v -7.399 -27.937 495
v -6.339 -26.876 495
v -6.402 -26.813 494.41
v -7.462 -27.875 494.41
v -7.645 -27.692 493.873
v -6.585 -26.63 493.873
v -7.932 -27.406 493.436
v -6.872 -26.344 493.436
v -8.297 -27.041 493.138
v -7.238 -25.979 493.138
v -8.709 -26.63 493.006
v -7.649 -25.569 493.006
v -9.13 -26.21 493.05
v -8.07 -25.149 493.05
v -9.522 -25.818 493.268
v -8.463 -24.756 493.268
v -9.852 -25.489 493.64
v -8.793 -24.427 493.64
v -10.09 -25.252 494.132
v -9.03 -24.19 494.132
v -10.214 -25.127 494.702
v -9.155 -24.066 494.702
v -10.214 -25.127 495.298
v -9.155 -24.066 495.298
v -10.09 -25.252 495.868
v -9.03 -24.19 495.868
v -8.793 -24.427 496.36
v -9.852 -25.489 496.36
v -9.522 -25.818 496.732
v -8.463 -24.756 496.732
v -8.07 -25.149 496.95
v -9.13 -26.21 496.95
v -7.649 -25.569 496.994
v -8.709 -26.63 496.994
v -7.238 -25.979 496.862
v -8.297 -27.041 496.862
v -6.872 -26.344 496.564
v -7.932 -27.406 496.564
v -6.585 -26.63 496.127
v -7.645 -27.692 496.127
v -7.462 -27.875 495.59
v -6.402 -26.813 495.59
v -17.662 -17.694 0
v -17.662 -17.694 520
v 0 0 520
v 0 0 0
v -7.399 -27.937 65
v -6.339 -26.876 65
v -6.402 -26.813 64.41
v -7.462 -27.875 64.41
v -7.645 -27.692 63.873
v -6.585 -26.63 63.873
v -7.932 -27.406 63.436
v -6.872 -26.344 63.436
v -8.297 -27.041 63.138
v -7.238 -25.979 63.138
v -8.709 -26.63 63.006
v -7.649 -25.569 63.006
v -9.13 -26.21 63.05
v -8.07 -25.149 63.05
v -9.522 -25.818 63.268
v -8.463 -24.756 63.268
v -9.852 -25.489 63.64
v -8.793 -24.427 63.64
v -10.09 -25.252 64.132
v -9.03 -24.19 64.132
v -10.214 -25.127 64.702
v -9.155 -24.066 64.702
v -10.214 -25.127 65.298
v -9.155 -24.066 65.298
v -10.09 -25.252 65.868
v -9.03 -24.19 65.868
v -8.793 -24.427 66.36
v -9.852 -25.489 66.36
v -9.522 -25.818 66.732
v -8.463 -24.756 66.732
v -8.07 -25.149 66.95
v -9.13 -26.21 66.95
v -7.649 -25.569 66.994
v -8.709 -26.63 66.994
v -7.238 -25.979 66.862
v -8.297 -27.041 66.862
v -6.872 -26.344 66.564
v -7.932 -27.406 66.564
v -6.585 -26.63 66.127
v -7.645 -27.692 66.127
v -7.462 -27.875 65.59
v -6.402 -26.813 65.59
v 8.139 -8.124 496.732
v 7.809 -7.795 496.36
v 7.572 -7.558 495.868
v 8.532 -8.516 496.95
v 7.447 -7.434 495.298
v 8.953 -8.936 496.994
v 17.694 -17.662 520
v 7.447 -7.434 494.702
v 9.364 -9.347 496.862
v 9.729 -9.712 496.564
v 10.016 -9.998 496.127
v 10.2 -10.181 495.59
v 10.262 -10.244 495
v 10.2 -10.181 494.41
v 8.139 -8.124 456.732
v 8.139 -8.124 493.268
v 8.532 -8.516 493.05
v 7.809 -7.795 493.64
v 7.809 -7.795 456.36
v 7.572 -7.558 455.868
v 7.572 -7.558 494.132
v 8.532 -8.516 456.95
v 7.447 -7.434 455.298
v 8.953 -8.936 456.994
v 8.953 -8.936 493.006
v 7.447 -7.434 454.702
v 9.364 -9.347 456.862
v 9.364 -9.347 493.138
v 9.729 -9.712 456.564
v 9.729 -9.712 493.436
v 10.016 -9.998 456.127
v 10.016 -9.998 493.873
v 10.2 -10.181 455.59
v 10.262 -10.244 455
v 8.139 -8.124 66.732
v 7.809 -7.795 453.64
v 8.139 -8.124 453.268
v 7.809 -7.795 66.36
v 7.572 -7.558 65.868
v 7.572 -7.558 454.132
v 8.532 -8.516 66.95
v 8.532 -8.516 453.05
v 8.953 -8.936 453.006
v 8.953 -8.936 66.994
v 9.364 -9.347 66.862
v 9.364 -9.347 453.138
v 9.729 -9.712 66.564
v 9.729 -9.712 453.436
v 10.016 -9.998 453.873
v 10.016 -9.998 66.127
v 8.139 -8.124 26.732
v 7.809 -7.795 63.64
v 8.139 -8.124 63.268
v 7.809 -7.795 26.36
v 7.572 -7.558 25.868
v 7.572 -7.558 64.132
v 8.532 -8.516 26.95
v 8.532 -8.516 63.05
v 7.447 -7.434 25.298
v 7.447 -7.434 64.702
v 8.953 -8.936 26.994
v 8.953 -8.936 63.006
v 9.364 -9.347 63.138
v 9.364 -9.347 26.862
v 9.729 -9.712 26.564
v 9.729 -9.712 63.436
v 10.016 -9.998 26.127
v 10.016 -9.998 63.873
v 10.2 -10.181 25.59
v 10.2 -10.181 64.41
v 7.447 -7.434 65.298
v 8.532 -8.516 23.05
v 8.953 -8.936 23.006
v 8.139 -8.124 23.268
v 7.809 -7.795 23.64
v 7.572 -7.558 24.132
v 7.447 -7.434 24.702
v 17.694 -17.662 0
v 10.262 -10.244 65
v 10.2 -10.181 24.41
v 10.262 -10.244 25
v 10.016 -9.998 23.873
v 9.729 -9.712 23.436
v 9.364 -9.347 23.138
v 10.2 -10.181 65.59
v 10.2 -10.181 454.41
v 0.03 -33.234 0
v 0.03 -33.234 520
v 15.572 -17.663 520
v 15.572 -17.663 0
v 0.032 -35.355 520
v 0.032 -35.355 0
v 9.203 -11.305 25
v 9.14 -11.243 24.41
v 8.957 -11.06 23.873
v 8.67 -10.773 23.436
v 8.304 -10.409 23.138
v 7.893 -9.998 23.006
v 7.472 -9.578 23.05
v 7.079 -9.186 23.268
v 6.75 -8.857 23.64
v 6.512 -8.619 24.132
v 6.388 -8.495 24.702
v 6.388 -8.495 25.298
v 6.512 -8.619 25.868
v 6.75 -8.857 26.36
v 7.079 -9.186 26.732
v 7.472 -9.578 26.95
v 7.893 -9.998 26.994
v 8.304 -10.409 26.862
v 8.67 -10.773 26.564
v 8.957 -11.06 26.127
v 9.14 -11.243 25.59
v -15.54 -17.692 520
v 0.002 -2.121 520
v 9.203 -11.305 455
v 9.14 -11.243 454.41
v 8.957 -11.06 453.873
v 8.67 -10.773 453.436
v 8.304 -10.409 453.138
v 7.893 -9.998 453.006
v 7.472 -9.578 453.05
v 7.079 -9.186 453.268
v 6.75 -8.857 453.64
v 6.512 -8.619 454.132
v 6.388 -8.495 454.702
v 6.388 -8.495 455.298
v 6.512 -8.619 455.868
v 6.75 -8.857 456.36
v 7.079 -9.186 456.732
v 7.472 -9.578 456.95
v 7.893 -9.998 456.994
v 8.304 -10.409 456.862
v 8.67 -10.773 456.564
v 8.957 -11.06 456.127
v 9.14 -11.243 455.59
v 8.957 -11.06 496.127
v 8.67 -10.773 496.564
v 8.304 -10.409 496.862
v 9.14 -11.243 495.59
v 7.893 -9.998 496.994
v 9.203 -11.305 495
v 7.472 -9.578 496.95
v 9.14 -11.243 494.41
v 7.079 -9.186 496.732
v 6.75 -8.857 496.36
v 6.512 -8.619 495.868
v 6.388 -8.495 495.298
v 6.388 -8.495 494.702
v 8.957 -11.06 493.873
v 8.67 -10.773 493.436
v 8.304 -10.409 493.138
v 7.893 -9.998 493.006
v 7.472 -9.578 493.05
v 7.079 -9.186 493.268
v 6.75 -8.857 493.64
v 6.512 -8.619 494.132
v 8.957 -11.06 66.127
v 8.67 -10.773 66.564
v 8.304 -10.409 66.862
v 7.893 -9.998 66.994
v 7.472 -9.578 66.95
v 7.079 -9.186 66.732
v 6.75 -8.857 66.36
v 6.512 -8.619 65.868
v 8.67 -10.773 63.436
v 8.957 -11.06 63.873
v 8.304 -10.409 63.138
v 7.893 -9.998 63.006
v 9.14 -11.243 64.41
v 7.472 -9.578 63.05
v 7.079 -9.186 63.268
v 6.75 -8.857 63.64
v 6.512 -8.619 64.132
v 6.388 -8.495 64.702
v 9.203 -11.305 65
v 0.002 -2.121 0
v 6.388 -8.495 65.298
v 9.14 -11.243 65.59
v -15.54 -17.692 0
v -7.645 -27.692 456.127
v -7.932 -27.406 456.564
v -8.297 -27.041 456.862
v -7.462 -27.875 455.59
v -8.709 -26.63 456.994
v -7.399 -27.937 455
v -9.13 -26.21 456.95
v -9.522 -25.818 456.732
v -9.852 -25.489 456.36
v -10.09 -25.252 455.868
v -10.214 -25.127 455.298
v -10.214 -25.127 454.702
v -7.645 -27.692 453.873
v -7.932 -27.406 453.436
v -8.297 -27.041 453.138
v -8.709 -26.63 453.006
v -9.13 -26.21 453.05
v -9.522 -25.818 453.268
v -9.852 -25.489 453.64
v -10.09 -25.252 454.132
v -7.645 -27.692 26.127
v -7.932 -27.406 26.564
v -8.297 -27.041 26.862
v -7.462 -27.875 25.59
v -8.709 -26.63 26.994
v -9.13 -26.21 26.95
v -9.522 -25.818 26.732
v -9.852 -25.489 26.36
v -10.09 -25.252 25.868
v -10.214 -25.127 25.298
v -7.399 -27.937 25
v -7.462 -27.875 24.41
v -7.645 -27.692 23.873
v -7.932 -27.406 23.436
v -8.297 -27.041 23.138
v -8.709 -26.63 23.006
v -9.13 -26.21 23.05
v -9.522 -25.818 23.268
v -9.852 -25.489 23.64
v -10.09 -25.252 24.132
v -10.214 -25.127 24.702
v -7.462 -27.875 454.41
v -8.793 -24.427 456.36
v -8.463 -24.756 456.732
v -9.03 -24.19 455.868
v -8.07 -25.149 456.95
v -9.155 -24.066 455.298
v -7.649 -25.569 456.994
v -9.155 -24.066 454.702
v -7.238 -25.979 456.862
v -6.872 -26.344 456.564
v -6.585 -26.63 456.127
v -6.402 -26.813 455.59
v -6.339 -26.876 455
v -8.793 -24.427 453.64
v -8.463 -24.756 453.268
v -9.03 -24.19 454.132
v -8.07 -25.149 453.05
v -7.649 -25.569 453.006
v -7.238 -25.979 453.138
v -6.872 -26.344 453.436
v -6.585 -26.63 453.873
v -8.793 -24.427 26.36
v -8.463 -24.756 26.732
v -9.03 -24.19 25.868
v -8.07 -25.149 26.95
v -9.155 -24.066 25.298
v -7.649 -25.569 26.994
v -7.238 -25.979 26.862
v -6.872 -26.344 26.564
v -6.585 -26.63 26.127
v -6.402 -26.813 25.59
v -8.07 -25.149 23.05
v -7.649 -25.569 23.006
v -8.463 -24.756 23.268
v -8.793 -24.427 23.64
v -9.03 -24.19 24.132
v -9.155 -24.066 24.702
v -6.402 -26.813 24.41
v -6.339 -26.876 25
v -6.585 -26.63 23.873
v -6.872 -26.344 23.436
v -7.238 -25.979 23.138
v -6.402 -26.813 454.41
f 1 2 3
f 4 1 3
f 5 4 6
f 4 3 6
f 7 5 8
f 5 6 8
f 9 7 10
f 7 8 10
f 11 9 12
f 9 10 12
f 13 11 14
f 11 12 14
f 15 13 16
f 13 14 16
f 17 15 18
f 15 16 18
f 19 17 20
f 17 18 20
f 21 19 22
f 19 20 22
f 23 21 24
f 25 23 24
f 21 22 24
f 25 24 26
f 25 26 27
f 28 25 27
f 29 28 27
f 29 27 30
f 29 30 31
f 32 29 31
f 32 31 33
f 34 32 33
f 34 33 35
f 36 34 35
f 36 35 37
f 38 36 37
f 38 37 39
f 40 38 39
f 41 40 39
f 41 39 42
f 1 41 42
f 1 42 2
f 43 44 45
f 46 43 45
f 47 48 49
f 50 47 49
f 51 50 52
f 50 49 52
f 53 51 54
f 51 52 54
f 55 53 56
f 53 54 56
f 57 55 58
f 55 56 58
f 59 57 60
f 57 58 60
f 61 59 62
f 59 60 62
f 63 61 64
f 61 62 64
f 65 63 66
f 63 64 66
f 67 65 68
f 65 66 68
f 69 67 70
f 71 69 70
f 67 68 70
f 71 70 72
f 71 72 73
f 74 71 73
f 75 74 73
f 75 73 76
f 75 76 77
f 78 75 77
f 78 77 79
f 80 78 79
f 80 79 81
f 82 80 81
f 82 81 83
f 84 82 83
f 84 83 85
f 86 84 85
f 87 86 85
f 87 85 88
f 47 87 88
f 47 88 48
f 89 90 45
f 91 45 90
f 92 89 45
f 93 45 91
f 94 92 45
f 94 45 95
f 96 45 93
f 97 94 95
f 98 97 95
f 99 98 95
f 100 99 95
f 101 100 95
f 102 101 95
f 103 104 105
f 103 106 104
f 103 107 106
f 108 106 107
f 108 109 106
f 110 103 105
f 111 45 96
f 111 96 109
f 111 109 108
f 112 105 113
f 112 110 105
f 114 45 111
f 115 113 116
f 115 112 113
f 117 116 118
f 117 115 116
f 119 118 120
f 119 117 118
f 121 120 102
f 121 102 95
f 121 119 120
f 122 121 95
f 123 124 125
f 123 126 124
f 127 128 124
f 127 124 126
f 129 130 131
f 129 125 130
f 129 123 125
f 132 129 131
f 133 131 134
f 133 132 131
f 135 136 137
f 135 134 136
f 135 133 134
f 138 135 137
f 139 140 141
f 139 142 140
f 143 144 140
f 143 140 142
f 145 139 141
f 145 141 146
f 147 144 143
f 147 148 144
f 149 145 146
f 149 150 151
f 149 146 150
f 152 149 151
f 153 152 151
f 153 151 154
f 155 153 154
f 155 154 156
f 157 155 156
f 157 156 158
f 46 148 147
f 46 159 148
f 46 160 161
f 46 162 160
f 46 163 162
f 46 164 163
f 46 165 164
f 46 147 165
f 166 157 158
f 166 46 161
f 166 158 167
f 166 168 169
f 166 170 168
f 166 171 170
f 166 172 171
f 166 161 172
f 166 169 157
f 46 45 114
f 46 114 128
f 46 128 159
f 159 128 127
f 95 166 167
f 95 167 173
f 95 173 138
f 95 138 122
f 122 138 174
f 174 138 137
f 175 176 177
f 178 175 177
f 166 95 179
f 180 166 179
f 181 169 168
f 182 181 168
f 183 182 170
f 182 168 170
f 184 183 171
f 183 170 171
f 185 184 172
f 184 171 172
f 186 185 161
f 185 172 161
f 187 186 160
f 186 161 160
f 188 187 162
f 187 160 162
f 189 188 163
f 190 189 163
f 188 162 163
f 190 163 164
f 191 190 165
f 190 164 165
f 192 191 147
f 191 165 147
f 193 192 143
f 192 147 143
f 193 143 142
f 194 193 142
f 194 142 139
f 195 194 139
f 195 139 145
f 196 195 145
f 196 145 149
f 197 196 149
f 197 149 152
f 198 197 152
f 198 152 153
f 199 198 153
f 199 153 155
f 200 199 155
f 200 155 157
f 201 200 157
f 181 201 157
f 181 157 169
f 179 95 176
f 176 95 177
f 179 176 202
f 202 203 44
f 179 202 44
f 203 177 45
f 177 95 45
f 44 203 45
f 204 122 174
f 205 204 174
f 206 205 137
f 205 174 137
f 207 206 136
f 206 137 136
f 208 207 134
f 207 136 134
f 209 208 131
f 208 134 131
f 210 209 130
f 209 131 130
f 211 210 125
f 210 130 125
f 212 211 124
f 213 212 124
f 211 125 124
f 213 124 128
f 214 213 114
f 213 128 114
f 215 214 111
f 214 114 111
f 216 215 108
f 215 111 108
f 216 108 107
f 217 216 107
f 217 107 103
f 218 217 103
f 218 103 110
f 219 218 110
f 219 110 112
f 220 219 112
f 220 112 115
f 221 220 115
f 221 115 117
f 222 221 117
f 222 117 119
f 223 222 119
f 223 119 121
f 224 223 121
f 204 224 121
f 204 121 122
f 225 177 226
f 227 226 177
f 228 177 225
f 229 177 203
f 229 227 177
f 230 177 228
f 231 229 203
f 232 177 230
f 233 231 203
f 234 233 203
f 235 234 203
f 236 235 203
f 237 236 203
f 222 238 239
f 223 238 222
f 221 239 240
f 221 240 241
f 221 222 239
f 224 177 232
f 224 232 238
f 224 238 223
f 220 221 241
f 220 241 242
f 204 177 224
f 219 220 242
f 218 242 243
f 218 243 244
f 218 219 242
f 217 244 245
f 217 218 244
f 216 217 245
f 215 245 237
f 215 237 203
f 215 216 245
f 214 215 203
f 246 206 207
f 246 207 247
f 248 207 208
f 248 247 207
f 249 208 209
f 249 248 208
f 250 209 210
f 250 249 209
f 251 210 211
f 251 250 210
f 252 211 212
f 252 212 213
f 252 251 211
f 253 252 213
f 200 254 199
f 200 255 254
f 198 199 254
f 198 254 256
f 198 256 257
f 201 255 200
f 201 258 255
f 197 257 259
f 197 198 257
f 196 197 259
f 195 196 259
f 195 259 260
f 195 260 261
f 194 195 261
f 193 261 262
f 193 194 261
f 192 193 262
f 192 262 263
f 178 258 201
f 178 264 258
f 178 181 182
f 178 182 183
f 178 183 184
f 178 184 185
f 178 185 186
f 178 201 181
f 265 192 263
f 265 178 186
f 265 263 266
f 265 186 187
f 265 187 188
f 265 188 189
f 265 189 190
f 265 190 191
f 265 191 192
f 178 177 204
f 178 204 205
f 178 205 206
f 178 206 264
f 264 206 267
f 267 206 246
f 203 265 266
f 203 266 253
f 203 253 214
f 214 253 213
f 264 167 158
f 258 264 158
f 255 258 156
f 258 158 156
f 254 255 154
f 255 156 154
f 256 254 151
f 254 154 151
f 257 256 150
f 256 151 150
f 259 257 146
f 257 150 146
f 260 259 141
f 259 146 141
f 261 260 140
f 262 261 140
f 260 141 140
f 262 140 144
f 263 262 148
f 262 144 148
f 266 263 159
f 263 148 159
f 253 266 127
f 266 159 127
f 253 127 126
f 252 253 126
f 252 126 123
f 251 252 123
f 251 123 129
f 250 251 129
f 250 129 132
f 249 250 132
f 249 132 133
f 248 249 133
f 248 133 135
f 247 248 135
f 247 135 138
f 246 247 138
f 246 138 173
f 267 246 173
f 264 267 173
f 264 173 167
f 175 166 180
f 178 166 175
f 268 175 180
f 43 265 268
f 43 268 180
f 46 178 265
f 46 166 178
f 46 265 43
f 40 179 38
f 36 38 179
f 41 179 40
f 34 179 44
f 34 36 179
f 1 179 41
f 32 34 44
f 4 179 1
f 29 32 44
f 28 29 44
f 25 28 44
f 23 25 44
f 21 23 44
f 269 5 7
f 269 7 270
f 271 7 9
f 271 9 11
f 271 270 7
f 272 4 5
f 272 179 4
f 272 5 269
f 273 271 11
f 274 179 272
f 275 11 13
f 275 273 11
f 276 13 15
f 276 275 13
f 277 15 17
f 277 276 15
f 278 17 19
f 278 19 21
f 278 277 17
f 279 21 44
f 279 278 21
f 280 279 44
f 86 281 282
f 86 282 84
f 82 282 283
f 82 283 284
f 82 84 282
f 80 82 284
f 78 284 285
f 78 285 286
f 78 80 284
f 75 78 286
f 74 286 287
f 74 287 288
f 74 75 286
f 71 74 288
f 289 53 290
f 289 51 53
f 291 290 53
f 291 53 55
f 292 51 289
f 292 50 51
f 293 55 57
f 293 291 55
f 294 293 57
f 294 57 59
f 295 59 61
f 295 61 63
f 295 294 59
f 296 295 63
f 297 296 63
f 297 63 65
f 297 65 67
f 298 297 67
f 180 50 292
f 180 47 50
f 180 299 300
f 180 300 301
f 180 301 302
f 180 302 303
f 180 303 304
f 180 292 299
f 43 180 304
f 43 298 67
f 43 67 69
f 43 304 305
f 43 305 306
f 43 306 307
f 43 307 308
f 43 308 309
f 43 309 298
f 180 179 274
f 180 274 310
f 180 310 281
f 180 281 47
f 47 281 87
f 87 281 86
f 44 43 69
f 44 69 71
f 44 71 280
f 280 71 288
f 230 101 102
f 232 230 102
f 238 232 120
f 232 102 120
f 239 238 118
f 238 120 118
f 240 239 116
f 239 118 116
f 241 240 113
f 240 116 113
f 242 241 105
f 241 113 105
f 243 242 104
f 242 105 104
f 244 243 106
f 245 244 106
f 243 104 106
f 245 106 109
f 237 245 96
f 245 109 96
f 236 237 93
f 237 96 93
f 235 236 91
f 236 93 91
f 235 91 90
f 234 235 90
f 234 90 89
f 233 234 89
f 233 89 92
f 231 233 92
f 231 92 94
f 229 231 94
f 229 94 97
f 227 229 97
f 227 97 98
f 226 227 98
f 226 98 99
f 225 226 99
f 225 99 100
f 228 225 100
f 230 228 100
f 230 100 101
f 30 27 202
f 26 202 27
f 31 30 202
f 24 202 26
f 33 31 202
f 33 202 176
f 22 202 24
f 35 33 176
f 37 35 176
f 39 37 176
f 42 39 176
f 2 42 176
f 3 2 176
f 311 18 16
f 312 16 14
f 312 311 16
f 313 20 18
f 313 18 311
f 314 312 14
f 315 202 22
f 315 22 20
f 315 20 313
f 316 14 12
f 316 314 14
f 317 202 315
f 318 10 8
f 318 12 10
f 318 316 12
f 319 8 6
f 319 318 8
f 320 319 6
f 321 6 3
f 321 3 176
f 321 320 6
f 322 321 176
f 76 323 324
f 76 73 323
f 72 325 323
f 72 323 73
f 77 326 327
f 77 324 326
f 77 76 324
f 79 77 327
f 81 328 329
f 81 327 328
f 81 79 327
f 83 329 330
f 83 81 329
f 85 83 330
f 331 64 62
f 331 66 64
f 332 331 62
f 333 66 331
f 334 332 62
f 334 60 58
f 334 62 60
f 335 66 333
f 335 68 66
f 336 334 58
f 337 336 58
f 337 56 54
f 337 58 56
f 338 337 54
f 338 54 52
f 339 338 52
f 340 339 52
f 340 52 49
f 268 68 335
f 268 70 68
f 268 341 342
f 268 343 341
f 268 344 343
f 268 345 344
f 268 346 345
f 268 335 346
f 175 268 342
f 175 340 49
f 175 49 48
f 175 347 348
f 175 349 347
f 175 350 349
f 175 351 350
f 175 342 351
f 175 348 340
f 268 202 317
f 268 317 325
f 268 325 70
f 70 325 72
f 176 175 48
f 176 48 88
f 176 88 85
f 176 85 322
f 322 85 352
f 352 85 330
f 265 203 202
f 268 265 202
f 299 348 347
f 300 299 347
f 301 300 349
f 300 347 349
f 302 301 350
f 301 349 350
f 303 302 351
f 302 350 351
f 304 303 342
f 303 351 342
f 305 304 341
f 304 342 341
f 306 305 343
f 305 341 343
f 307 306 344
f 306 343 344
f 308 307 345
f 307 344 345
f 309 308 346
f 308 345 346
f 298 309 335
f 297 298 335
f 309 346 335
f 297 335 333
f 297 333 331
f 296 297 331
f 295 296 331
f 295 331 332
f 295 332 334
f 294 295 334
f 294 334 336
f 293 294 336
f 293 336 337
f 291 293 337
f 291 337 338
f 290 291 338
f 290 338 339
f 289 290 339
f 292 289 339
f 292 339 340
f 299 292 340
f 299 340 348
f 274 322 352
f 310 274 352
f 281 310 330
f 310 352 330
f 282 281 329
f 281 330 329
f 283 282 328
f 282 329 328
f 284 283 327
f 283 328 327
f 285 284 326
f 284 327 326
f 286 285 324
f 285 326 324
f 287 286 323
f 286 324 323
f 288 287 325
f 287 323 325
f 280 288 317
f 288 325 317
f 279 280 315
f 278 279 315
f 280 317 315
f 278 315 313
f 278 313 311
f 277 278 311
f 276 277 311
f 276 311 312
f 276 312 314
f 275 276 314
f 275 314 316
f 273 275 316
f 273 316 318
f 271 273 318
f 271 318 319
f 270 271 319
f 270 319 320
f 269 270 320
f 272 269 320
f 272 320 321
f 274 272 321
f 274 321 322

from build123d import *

# Parameters (mm, degrees)
EXTRUDE_1_DEPTH     = 520
SKETCH_2_R          = 2
CUT_EXTRUDE_1_DEPTH = 38.499979182


with BuildPart() as part:
    # 草圖1 → 填料-伸長1 (new body)
    with BuildSketch(Plane.XY):
        Polygon((0, 0), (17.69379362, -17.661530719), (0.032262901, -35.355324339), (-17.661530719, -17.69379362), align=None)
        Polygon((0.001935774, -2.12131946), (-15.540211259, -17.691857846), (0.030327127, -33.234004879), (15.57247416, -17.663466493), align=None, mode=Mode.SUBTRACT)
    extrude(amount=EXTRUDE_1_DEPTH)

    # 草圖2 → 除料-伸長1 (cut, through all)
    with BuildSketch(Plane(origin=(0, 0, 0), x_dir=(0.707751745, -0.706461229, 0), z_dir=(0.706461229, 0.707751745, 0))):
        with Locations((12.5, -455)):
            Circle(SKETCH_2_R)
        with Locations((12.5, -495)):
            Circle(SKETCH_2_R)
        with Locations((12.5, -25)):
            Circle(SKETCH_2_R)
        with Locations((12.5, -65)):
            Circle(SKETCH_2_R)
    extrude(amount=-CUT_EXTRUDE_1_DEPTH, mode=Mode.SUBTRACT)


solid = part.part
